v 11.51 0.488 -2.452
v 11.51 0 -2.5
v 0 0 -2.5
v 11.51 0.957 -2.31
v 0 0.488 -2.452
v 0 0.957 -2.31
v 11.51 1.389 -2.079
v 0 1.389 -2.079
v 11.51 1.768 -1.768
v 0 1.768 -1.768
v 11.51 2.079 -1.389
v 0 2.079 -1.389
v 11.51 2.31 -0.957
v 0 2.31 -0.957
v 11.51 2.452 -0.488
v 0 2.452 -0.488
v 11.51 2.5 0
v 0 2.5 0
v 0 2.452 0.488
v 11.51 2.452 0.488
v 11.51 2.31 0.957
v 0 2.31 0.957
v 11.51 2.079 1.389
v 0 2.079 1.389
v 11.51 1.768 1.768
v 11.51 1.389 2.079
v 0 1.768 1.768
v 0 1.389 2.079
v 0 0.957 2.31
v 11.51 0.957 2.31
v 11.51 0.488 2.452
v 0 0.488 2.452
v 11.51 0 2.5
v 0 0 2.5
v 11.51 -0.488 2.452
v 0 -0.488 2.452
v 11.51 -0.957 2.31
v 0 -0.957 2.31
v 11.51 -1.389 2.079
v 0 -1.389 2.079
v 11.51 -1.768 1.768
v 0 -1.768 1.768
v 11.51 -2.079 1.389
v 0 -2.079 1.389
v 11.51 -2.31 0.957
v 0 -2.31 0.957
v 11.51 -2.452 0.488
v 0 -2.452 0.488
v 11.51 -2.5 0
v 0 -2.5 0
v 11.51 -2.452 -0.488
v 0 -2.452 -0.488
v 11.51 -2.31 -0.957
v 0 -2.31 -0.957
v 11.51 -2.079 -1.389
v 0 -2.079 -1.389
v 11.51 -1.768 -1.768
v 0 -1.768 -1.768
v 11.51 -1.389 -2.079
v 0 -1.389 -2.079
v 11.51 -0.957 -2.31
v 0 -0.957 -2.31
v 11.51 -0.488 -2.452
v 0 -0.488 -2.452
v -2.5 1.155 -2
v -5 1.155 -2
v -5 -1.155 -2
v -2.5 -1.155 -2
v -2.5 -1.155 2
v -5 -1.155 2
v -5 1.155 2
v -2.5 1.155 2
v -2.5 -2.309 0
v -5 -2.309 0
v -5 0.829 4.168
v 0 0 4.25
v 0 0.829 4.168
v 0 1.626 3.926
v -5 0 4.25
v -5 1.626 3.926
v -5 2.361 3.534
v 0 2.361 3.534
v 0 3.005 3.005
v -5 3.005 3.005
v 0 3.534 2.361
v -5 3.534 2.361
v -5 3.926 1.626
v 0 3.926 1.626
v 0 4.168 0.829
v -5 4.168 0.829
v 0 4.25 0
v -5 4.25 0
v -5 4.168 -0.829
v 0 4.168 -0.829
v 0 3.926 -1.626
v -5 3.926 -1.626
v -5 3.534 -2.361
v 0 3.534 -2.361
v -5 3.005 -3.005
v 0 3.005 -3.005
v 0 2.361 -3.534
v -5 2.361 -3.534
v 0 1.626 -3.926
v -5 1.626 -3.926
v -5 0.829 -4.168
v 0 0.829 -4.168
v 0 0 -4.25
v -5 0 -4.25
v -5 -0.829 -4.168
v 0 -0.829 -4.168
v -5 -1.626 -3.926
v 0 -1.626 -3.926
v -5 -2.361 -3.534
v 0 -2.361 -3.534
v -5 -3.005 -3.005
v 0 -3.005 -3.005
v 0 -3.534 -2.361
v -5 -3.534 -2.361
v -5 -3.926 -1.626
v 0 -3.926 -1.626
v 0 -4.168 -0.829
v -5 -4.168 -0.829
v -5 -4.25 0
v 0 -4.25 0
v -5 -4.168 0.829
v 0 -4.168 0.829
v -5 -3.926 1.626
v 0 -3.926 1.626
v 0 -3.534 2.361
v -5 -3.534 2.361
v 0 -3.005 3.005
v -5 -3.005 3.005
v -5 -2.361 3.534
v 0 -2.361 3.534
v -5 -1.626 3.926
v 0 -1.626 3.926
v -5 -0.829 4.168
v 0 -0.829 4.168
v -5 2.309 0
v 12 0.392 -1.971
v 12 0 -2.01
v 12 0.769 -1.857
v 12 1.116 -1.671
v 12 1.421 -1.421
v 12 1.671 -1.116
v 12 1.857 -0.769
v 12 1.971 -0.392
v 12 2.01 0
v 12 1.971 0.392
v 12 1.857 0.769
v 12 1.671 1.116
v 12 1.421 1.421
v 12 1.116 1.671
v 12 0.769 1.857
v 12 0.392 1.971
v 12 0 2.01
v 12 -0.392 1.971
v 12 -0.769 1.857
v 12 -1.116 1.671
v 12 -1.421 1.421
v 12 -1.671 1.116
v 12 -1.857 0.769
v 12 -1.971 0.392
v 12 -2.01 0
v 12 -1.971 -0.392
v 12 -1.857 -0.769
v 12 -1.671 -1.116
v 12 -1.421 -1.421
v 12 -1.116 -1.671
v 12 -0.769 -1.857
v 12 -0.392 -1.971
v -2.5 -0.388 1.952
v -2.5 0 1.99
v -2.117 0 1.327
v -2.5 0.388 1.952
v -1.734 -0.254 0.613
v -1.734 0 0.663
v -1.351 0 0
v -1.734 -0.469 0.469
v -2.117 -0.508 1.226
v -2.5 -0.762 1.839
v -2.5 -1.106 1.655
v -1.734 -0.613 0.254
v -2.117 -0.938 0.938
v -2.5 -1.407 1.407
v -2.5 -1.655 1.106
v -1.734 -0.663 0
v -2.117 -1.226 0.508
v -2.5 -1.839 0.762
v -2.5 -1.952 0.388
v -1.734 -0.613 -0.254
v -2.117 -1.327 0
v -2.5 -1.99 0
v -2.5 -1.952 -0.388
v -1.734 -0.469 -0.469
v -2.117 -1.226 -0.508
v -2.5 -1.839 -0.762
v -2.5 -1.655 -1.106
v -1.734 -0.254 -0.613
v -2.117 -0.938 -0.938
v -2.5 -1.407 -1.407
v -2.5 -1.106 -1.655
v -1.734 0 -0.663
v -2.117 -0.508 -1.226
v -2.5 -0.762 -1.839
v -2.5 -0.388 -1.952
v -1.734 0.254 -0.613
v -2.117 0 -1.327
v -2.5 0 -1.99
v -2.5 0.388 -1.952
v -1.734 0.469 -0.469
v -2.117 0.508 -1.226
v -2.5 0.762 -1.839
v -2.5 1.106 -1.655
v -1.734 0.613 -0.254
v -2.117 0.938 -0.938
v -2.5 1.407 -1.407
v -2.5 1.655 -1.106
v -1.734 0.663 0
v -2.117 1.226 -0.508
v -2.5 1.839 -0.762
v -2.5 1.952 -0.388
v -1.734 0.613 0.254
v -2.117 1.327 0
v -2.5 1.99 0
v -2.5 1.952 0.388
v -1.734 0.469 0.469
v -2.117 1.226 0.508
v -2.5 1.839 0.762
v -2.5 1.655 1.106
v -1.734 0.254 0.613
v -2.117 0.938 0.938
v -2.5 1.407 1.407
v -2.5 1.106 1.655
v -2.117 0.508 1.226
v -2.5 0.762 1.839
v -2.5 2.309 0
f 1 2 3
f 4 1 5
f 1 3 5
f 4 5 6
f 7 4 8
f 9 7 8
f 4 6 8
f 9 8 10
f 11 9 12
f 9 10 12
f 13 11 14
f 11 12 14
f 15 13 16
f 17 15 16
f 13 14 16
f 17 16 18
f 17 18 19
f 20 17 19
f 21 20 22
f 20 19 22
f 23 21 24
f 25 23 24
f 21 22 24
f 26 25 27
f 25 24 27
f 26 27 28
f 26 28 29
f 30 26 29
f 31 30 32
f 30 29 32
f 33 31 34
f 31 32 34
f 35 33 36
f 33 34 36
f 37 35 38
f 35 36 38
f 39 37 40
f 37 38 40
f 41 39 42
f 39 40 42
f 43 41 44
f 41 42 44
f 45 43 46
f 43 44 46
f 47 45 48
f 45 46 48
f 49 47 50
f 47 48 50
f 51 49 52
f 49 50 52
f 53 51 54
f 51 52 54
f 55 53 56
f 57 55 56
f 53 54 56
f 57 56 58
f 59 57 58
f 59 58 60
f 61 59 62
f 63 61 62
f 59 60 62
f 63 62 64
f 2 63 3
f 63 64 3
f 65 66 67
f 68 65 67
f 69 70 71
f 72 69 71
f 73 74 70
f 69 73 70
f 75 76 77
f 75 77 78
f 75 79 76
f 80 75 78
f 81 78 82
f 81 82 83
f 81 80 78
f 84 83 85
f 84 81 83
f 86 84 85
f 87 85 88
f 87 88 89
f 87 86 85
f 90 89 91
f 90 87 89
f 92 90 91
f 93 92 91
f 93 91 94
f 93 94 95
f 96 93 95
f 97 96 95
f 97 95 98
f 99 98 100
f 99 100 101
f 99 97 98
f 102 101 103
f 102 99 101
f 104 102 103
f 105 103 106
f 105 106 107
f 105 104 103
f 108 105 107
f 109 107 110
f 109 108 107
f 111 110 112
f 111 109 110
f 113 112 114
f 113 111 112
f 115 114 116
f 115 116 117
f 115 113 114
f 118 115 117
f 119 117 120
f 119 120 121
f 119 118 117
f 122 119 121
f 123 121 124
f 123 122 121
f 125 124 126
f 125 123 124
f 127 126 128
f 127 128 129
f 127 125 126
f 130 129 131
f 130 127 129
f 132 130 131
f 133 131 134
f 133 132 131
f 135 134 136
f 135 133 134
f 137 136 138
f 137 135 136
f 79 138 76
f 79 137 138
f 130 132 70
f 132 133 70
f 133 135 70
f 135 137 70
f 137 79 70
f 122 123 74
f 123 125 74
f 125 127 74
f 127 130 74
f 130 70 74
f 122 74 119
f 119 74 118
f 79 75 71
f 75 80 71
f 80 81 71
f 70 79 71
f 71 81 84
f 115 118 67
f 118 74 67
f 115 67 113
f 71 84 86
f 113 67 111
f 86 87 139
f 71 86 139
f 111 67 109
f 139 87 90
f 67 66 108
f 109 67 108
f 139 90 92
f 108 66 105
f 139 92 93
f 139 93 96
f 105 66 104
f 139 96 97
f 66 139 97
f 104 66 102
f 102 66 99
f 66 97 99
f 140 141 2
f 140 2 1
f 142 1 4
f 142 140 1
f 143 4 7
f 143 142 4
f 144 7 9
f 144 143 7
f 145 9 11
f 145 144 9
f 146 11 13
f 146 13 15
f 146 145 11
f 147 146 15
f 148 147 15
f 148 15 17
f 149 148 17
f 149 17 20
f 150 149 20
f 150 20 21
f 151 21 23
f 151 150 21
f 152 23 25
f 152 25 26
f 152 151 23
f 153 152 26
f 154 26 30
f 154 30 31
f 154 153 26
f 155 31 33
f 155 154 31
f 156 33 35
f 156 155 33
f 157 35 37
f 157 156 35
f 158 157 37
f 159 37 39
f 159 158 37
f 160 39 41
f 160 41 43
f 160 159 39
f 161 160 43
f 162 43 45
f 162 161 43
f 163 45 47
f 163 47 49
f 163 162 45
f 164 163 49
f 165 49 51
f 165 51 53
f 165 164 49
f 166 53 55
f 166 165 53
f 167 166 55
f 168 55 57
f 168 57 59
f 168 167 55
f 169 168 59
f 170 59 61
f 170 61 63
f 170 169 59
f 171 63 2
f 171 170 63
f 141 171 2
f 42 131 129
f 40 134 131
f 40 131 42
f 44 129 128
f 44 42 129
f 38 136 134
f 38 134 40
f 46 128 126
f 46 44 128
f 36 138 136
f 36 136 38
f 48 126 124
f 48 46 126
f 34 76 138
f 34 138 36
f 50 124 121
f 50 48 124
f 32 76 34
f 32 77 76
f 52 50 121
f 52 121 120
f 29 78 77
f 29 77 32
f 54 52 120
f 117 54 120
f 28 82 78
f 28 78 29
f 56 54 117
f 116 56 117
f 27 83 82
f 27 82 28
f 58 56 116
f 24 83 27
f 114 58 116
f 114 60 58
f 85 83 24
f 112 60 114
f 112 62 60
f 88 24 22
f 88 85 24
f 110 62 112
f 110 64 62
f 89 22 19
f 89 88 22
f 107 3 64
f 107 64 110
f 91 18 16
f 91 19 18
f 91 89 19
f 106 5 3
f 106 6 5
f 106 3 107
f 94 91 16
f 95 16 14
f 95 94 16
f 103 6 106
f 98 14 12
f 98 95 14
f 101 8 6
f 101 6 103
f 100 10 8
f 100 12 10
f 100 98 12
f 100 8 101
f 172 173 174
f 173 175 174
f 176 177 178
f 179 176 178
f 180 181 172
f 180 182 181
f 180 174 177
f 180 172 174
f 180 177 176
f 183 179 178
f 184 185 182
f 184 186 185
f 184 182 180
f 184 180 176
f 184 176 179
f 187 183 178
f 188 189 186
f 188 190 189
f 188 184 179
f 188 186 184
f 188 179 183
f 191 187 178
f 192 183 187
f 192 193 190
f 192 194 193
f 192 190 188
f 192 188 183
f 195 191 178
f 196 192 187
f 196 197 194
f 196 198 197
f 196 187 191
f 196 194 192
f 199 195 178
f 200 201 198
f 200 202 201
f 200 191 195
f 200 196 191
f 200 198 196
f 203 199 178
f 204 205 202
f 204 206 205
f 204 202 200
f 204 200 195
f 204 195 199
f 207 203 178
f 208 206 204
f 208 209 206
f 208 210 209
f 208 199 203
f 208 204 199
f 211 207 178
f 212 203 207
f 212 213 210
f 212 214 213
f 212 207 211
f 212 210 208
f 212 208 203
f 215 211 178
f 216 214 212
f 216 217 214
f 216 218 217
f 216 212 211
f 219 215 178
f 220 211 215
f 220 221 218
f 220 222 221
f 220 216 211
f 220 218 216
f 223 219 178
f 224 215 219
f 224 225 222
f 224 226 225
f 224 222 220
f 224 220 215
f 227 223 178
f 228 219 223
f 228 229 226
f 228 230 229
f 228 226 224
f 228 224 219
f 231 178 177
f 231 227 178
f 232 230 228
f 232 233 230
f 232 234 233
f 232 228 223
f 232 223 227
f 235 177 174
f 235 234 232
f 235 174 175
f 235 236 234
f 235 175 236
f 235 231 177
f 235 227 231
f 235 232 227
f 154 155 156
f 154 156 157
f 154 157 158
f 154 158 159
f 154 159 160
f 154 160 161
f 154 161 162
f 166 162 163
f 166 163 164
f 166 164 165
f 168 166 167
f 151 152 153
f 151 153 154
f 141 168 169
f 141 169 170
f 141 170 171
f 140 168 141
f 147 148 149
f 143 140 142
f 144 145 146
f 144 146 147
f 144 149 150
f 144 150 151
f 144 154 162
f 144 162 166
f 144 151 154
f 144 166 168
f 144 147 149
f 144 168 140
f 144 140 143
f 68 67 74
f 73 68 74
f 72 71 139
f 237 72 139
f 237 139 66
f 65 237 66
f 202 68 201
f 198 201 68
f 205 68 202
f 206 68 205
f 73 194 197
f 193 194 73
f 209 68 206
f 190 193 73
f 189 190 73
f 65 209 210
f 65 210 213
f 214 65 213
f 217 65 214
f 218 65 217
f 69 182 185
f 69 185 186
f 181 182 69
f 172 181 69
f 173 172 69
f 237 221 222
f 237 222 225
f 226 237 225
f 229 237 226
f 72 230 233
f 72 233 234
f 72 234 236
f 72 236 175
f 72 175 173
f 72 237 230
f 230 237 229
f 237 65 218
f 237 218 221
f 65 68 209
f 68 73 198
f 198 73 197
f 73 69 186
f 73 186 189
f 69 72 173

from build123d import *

# Parameters (mm, degrees)
SKETCH1_W           = 5
SKETCH1_H           = 4.25
SKETCH2_R           = 2.5
BOSS_EXTRUDE1_DEPTH = 12
CUT_EXTRUDE1_DEPTH  = 2.5
CHAMFER1_SIZE       = 0.4905


with BuildPart() as part:
    # Sketch1 → Revolve1 (revolve)
    with BuildSketch(Plane(origin=(0, 0, 0), x_dir=(-1, 0, 0), z_dir=(0, 0, -1)), mode=Mode.PRIVATE) as revolve1_sk:
        with Locations((2.5, 2.125)):
            Rectangle(SKETCH1_W, SKETCH1_H)
    revolve(revolve1_sk.sketch.rotate(Axis((0, 0, 0), (-1, 0, 0)), 270), axis=Axis((0, 0, 0), (-1, 0, 0)))

    # Sketch2 → Boss-Extrude1 (add)
    with BuildSketch(Plane(origin=(0, 0, 0), x_dir=(0, 0, -1), z_dir=(1, 0, 0))):
        Circle(SKETCH2_R)
    extrude(amount=BOSS_EXTRUDE1_DEPTH)

    # Sketch3 → Cut-Extrude1 (cut)
    with BuildSketch(Plane.ZY.offset(5)):
        Polygon((2, 1.154700538), (0, 2.309401077), (-2, 1.154700538), (-2, -1.154700538), (0, -2.309401077), (2, -1.154700538), align=None)
    extrude(amount=-CUT_EXTRUDE1_DEPTH, mode=Mode.SUBTRACT)

    # Sketch4 → Cut-Revolve1 (revolve, cut)
    with BuildSketch(Plane.XY, mode=Mode.PRIVATE) as cut_revolve1_sk:
        Polygon((-2.5, 1.99), (-2.5, 0), (-1.351072964, 0), align=None)
    revolve(cut_revolve1_sk.sketch.rotate(Axis((-2.500025, 0, 0), (1, 0, 0)), 90), axis=Axis((-2.500025, 0, 0), (1, 0, 0)), mode=Mode.SUBTRACT)

    # Chamfer1
    chamfer1_edges = [part.edges().sort_by_distance(p)[0] for p in [
        (12, 0, 2.5),
    ]]
    chamfer(chamfer1_edges, length=CHAMFER1_SIZE)


solid = part.part
